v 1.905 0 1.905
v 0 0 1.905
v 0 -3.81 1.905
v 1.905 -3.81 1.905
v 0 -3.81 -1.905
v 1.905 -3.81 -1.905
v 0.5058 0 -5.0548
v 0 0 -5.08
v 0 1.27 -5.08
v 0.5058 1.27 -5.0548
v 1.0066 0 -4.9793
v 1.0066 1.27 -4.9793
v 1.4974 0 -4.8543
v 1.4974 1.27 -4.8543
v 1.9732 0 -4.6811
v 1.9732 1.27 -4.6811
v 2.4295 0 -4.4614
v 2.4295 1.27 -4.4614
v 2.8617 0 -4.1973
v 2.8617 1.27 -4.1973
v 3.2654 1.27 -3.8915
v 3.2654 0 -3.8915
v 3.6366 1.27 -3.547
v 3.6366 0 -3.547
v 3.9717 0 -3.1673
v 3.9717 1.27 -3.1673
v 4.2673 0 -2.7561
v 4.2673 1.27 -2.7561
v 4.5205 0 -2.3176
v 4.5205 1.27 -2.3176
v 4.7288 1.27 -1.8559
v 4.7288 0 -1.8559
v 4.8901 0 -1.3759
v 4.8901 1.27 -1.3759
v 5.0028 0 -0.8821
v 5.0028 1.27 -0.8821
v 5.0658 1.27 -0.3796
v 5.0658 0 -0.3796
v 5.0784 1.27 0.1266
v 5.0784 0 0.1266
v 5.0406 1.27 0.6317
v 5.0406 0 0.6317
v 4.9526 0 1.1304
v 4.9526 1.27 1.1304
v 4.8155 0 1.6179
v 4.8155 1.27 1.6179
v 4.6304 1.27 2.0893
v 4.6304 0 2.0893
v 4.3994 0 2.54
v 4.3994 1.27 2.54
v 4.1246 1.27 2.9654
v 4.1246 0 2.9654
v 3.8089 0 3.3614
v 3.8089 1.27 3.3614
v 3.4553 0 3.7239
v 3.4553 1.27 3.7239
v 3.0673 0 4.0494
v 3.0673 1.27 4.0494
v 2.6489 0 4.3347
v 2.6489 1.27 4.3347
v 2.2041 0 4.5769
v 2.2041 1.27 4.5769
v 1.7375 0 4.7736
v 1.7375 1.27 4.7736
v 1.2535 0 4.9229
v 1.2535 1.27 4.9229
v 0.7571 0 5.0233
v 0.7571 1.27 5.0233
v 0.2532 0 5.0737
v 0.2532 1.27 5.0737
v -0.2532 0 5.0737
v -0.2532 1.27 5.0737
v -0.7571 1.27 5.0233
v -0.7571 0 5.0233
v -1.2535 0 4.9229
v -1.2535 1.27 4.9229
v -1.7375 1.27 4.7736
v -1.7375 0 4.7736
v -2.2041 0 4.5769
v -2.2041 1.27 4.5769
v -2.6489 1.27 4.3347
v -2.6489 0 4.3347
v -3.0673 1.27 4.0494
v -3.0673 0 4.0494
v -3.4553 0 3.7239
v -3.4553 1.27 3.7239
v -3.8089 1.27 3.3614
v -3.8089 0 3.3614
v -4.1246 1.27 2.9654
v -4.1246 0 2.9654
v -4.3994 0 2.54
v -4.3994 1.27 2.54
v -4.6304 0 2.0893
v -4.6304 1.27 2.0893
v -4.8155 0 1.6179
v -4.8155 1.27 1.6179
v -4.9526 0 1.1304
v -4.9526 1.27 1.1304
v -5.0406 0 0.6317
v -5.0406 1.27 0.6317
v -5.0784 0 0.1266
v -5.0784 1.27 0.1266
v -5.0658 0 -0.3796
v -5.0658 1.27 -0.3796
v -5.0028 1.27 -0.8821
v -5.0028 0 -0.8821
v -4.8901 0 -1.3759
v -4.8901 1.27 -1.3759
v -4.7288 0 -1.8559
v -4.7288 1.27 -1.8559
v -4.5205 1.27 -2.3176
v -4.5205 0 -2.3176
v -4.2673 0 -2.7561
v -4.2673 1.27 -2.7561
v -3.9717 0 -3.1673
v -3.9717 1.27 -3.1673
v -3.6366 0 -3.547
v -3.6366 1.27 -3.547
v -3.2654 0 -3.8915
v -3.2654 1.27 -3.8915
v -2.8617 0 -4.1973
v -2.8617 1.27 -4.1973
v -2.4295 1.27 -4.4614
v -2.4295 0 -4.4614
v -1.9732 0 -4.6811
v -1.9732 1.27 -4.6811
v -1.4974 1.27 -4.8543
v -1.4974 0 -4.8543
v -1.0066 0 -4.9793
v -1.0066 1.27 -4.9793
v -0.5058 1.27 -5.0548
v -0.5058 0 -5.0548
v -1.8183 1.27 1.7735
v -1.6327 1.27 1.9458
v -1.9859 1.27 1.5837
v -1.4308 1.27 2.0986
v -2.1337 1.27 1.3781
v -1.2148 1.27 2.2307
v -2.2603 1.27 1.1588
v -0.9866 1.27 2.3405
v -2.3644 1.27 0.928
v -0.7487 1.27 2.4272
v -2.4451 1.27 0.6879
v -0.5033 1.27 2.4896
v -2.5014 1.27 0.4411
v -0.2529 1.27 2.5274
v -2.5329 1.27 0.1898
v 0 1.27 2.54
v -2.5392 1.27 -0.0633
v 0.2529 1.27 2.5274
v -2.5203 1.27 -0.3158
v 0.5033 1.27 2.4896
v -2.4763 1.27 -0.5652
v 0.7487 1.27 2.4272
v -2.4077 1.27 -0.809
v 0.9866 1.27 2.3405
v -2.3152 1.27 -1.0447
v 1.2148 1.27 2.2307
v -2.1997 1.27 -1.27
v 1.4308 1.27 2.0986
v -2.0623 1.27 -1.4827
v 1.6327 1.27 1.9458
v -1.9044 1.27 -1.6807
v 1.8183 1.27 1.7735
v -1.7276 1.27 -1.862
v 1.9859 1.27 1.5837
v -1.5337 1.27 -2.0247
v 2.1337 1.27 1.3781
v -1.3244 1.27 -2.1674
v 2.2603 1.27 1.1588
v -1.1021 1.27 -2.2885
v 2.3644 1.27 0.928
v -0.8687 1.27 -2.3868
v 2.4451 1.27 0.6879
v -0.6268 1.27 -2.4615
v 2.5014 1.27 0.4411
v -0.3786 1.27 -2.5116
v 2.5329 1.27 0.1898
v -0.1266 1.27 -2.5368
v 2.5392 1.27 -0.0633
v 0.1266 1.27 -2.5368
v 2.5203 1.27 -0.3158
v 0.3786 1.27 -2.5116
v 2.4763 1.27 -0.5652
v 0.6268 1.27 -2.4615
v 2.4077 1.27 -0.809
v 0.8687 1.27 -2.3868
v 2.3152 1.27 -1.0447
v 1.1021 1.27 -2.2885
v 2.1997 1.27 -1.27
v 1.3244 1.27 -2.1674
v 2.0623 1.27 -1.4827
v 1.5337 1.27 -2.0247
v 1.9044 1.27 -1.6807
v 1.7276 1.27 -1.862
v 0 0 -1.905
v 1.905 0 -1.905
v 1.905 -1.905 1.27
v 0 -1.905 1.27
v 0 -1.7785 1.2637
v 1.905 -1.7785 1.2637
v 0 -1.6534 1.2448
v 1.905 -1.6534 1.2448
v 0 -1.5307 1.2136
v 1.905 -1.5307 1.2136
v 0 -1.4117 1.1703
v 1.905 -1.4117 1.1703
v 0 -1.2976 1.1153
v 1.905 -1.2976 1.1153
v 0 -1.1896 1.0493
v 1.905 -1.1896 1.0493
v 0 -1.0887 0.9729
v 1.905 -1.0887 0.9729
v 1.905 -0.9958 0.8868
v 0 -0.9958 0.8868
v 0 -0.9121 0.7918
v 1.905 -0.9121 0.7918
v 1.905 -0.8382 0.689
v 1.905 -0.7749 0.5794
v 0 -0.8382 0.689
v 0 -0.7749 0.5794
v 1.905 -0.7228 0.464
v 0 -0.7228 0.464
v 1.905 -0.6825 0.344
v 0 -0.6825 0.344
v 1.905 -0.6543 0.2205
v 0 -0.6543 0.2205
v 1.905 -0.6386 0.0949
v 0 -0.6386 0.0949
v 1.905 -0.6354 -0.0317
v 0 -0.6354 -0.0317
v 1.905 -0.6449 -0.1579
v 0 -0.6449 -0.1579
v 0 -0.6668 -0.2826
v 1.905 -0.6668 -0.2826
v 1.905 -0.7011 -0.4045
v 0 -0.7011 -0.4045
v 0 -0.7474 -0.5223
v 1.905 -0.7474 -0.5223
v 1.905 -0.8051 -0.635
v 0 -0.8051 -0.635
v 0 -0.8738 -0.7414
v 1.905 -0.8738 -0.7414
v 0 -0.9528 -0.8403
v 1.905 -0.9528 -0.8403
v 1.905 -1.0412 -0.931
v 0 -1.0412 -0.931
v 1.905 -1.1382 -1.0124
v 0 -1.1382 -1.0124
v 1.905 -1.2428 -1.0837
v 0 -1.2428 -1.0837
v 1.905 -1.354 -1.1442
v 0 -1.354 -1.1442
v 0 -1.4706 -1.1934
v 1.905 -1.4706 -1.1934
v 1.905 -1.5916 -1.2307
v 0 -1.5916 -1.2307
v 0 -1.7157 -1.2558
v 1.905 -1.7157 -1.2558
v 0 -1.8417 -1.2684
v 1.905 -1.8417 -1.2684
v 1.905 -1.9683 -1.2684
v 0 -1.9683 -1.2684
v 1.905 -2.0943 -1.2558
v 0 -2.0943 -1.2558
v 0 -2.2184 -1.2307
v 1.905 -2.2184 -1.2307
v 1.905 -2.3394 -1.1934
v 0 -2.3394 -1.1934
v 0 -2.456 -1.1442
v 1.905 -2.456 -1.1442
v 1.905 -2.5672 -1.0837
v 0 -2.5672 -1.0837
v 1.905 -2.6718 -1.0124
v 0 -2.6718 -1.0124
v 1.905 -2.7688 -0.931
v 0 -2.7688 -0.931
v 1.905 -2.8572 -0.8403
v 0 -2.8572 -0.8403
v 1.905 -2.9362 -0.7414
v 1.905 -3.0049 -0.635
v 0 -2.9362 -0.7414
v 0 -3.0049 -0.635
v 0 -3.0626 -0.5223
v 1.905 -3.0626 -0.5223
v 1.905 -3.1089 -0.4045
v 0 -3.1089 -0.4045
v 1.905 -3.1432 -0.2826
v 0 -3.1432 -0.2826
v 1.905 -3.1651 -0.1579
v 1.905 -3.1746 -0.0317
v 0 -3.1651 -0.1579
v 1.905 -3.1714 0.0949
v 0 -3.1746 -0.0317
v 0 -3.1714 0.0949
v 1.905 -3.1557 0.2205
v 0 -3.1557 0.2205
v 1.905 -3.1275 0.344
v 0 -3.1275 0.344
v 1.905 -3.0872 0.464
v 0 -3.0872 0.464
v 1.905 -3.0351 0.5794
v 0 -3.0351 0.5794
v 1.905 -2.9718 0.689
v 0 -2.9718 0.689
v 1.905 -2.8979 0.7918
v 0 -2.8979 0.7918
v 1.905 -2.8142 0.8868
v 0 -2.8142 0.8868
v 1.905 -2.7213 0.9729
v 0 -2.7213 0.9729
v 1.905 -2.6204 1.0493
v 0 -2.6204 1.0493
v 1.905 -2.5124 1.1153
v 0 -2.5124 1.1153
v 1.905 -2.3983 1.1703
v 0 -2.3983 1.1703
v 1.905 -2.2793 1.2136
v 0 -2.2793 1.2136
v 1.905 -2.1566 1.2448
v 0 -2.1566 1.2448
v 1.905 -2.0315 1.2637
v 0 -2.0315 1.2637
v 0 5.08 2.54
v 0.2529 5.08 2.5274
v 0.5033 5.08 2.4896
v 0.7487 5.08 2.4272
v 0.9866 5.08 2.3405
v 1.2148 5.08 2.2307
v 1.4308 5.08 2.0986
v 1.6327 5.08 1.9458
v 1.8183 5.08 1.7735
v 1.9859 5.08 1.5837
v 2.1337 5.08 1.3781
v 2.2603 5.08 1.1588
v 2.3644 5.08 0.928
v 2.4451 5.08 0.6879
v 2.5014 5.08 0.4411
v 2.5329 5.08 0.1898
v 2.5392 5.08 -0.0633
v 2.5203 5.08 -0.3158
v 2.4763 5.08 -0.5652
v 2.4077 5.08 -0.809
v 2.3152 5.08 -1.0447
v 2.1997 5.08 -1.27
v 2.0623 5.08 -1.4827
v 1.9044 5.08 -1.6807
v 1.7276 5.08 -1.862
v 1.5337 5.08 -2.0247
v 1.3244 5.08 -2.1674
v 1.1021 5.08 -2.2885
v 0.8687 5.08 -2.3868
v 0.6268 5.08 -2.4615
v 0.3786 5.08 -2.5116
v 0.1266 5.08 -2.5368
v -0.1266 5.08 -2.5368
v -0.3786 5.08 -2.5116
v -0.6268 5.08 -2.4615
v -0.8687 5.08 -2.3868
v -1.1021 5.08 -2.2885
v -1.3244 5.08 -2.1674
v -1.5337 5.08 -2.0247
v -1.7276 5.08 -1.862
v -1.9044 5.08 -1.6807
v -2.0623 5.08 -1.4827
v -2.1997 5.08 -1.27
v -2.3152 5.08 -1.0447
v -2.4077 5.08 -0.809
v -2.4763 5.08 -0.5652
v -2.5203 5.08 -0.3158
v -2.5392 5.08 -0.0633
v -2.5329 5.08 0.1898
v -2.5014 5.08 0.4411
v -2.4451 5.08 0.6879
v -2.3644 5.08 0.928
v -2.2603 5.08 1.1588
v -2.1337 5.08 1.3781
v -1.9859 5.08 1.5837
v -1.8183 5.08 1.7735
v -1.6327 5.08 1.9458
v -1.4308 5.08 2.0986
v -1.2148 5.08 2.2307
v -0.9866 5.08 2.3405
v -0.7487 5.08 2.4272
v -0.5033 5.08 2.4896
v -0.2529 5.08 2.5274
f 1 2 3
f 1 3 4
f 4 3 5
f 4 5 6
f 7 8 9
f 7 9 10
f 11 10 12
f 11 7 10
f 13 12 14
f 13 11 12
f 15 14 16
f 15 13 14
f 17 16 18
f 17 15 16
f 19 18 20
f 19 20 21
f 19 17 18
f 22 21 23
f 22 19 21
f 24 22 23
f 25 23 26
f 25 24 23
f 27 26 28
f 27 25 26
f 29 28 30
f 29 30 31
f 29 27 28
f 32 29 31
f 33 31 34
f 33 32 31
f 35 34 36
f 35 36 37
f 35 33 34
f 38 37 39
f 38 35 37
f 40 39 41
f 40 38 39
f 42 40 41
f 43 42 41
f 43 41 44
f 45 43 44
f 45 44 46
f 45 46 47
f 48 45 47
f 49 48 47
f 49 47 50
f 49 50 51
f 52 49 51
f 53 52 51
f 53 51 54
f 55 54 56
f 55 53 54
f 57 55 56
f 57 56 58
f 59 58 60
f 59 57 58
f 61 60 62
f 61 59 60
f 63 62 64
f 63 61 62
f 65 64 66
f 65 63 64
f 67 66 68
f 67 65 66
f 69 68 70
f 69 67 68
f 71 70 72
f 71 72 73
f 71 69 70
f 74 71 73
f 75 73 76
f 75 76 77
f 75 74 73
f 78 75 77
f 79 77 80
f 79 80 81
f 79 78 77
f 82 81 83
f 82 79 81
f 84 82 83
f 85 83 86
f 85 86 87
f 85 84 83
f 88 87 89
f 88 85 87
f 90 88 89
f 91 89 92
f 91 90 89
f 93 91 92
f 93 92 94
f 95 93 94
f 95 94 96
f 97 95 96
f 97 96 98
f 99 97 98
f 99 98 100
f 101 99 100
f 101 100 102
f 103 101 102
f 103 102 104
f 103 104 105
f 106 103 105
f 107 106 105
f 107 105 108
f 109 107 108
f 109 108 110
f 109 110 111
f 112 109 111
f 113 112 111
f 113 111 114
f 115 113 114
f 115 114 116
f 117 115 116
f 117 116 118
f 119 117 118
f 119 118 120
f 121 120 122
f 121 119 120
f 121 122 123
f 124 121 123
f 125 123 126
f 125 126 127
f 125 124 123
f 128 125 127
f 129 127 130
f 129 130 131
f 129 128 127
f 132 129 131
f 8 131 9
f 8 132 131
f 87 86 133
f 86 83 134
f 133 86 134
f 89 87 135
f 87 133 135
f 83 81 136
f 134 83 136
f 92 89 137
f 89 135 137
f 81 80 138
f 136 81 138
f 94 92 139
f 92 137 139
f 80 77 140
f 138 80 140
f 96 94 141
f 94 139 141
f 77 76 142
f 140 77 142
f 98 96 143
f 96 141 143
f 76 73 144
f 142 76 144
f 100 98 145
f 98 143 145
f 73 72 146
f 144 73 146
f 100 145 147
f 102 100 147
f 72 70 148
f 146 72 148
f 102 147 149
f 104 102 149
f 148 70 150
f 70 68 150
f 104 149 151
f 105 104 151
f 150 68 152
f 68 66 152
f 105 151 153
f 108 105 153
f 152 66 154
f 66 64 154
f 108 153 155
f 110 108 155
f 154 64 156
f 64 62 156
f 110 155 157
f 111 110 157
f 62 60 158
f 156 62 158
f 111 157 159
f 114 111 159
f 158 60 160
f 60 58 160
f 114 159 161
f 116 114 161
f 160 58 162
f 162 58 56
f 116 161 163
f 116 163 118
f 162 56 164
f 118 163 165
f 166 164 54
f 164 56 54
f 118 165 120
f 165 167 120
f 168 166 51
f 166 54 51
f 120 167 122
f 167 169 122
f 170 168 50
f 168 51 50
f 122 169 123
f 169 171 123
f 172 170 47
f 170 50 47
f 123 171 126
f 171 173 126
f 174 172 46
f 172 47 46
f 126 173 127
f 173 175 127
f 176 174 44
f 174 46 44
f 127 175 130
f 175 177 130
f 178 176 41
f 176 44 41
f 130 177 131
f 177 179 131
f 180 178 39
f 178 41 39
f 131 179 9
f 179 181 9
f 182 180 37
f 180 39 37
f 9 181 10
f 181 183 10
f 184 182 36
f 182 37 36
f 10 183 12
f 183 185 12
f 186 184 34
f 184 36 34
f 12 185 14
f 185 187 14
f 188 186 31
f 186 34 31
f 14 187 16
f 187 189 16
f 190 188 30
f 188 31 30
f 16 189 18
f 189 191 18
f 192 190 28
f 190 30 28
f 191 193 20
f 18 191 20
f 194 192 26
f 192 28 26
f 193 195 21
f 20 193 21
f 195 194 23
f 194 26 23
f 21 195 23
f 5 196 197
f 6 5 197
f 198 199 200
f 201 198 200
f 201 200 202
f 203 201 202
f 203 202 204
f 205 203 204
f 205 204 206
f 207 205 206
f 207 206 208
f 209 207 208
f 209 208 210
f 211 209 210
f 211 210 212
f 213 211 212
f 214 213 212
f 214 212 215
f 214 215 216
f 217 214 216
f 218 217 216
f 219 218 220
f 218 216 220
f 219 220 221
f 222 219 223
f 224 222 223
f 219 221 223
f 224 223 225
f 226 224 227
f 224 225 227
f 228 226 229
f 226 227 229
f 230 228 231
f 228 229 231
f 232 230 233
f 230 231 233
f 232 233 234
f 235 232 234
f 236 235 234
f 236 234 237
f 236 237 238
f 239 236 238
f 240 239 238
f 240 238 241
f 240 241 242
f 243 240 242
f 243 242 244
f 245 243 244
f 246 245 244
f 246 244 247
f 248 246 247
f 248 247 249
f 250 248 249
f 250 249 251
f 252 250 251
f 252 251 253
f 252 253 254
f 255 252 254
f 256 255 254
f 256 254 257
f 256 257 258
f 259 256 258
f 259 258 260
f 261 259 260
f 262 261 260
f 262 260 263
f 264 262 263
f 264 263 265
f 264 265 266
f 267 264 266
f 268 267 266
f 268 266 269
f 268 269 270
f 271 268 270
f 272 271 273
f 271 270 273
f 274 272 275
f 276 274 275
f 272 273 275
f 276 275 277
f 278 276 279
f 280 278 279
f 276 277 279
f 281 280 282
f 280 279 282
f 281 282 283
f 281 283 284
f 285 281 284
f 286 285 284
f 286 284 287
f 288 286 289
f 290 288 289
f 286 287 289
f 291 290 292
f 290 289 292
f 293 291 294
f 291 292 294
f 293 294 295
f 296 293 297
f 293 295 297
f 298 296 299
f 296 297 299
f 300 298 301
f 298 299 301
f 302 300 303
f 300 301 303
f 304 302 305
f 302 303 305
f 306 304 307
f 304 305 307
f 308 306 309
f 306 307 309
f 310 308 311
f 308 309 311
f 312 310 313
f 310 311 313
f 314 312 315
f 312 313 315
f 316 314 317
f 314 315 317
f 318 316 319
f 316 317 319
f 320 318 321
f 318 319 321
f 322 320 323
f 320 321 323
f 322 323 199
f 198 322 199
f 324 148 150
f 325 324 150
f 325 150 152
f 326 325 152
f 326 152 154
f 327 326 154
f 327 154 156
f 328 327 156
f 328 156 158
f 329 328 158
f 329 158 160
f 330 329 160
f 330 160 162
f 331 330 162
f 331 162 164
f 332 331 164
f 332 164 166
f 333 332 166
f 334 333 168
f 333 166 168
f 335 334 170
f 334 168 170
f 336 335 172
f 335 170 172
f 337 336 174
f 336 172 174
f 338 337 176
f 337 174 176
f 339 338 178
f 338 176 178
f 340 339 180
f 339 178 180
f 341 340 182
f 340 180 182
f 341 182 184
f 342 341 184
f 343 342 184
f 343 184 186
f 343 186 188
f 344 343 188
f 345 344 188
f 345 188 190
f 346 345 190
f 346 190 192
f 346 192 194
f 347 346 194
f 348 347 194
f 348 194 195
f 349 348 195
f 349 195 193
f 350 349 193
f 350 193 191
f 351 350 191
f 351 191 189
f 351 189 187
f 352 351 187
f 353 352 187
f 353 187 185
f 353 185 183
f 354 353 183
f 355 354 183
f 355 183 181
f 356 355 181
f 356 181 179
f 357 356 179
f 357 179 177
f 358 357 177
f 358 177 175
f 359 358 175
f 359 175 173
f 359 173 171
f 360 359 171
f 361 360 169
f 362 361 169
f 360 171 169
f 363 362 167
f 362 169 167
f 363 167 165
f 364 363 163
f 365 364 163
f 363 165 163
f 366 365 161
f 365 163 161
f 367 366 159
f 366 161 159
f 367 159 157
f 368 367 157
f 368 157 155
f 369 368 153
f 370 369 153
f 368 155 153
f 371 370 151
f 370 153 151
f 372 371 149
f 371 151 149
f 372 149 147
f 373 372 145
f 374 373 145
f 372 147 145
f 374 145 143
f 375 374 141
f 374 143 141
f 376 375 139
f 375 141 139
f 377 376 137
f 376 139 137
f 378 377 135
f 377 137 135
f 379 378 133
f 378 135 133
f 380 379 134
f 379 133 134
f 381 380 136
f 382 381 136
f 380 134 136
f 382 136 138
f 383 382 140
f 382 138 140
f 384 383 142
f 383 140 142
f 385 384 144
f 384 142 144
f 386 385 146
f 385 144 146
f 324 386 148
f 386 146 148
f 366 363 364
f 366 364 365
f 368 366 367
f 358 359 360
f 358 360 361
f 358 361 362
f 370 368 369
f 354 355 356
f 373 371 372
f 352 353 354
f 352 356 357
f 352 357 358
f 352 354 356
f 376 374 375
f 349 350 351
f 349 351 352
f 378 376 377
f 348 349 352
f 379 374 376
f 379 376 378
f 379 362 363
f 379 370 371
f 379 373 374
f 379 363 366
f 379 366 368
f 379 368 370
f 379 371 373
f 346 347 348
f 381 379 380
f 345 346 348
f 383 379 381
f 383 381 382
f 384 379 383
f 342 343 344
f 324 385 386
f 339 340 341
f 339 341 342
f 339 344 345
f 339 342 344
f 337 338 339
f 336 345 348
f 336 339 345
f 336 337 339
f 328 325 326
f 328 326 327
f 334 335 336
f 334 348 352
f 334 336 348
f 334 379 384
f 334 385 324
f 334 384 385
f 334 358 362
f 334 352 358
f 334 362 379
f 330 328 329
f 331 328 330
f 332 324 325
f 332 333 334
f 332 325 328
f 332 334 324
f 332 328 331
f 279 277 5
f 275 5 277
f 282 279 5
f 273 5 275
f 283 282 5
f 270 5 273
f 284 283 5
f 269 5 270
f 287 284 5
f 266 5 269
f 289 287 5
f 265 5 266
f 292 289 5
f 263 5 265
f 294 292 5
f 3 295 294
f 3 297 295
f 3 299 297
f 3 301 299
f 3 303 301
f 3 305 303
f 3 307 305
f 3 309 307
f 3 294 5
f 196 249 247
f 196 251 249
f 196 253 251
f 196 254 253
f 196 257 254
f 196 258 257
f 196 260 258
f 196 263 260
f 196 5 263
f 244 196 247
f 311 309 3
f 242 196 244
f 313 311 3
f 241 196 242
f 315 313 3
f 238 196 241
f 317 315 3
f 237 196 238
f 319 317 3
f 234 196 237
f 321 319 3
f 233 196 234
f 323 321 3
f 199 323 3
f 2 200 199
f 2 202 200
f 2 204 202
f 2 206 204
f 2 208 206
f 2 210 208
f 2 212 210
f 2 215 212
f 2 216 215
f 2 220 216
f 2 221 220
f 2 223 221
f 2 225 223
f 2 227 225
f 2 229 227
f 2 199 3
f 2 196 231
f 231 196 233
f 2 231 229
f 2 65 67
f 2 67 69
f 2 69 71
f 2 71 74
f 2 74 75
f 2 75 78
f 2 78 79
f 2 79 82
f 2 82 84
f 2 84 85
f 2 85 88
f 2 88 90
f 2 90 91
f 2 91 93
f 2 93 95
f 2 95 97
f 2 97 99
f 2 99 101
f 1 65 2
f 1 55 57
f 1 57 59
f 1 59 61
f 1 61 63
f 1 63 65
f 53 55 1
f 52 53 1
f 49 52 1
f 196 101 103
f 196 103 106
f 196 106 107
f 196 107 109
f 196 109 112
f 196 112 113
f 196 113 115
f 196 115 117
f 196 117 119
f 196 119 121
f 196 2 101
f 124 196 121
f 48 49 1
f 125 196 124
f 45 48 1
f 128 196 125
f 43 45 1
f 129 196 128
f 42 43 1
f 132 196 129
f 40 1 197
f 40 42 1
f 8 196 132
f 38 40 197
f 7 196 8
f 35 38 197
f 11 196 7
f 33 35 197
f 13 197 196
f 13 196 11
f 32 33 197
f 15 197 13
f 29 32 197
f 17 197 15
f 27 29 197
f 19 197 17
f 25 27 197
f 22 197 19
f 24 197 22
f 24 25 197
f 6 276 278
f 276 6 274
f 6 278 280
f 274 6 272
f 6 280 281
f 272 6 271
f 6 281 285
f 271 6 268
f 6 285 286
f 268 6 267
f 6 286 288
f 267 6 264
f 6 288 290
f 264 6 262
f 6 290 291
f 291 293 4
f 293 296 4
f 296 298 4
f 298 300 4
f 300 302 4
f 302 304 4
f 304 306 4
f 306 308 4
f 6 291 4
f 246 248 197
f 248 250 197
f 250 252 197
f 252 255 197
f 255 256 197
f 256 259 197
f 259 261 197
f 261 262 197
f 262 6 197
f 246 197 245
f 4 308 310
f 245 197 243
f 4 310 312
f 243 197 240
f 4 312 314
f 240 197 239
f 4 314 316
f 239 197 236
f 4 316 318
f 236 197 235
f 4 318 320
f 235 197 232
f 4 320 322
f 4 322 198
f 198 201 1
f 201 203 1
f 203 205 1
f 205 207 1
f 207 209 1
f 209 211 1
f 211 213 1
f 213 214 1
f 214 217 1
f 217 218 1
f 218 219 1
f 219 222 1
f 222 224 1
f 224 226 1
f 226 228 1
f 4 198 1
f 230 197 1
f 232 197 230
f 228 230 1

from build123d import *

# Parameters (mm, degrees)
SKETCH1_R           = 2.54
BOSS_EXTRUDE1_DEPTH = 5.08
SKETCH2_R           = 5.08
SKETCH2_R_2         = 2.54
BOSS_EXTRUDE2_DEPTH = 1.27
SKETCH3_W           = 1.905
SKETCH3_H           = 3.81
BOSS_EXTRUDE3_DEPTH = 3.81
CUT_EXTRUDE1_REACH  = 10.799
SKETCH4_R           = 1.27


with BuildPart() as part:
    # Sketch1 → Boss-Extrude1 (new body)
    with BuildSketch(Plane(origin=(0, 0, 0), x_dir=(1, 0, 0), z_dir=(0, 1, 0))):
        with Locations(Location((0, 0, 0), (0, 0, 270))):
            Circle(SKETCH1_R)
    extrude(amount=BOSS_EXTRUDE1_DEPTH)

    # Sketch2 → Boss-Extrude2 (add)
    with BuildSketch(Plane.XZ):
        with Locations(Location((0, 0, 0), (0, 0, 270))):
            Circle(SKETCH2_R)
        with Locations(Location((0, 0, 0), (0, 0, 270))):
            Circle(SKETCH2_R_2, mode=Mode.SUBTRACT)
    extrude(amount=-BOSS_EXTRUDE2_DEPTH)

    # Sketch3 → Boss-Extrude3 (add)
    with BuildSketch(Plane.XZ):
        with Locations((0.9525, 0)):
            Rectangle(SKETCH3_W, SKETCH3_H)
    extrude(amount=BOSS_EXTRUDE3_DEPTH)

    # Sketch4 → Cut-Extrude1 (cut, up to next)
    with BuildSketch(Plane.ZY, mode=Mode.PRIVATE) as cut_extrude1_sk1:
        with Locations((0, -1.905)):
            Circle(SKETCH4_R)
    cut_extrude1_tool1 = extrude(cut_extrude1_sk1.sketch, amount=-CUT_EXTRUDE1_REACH, mode=Mode.PRIVATE) & part.part
    add(cut_extrude1_tool1.solids().sort_by_distance((0, -1.905, 0))[0], mode=Mode.SUBTRACT)


solid = part.part
